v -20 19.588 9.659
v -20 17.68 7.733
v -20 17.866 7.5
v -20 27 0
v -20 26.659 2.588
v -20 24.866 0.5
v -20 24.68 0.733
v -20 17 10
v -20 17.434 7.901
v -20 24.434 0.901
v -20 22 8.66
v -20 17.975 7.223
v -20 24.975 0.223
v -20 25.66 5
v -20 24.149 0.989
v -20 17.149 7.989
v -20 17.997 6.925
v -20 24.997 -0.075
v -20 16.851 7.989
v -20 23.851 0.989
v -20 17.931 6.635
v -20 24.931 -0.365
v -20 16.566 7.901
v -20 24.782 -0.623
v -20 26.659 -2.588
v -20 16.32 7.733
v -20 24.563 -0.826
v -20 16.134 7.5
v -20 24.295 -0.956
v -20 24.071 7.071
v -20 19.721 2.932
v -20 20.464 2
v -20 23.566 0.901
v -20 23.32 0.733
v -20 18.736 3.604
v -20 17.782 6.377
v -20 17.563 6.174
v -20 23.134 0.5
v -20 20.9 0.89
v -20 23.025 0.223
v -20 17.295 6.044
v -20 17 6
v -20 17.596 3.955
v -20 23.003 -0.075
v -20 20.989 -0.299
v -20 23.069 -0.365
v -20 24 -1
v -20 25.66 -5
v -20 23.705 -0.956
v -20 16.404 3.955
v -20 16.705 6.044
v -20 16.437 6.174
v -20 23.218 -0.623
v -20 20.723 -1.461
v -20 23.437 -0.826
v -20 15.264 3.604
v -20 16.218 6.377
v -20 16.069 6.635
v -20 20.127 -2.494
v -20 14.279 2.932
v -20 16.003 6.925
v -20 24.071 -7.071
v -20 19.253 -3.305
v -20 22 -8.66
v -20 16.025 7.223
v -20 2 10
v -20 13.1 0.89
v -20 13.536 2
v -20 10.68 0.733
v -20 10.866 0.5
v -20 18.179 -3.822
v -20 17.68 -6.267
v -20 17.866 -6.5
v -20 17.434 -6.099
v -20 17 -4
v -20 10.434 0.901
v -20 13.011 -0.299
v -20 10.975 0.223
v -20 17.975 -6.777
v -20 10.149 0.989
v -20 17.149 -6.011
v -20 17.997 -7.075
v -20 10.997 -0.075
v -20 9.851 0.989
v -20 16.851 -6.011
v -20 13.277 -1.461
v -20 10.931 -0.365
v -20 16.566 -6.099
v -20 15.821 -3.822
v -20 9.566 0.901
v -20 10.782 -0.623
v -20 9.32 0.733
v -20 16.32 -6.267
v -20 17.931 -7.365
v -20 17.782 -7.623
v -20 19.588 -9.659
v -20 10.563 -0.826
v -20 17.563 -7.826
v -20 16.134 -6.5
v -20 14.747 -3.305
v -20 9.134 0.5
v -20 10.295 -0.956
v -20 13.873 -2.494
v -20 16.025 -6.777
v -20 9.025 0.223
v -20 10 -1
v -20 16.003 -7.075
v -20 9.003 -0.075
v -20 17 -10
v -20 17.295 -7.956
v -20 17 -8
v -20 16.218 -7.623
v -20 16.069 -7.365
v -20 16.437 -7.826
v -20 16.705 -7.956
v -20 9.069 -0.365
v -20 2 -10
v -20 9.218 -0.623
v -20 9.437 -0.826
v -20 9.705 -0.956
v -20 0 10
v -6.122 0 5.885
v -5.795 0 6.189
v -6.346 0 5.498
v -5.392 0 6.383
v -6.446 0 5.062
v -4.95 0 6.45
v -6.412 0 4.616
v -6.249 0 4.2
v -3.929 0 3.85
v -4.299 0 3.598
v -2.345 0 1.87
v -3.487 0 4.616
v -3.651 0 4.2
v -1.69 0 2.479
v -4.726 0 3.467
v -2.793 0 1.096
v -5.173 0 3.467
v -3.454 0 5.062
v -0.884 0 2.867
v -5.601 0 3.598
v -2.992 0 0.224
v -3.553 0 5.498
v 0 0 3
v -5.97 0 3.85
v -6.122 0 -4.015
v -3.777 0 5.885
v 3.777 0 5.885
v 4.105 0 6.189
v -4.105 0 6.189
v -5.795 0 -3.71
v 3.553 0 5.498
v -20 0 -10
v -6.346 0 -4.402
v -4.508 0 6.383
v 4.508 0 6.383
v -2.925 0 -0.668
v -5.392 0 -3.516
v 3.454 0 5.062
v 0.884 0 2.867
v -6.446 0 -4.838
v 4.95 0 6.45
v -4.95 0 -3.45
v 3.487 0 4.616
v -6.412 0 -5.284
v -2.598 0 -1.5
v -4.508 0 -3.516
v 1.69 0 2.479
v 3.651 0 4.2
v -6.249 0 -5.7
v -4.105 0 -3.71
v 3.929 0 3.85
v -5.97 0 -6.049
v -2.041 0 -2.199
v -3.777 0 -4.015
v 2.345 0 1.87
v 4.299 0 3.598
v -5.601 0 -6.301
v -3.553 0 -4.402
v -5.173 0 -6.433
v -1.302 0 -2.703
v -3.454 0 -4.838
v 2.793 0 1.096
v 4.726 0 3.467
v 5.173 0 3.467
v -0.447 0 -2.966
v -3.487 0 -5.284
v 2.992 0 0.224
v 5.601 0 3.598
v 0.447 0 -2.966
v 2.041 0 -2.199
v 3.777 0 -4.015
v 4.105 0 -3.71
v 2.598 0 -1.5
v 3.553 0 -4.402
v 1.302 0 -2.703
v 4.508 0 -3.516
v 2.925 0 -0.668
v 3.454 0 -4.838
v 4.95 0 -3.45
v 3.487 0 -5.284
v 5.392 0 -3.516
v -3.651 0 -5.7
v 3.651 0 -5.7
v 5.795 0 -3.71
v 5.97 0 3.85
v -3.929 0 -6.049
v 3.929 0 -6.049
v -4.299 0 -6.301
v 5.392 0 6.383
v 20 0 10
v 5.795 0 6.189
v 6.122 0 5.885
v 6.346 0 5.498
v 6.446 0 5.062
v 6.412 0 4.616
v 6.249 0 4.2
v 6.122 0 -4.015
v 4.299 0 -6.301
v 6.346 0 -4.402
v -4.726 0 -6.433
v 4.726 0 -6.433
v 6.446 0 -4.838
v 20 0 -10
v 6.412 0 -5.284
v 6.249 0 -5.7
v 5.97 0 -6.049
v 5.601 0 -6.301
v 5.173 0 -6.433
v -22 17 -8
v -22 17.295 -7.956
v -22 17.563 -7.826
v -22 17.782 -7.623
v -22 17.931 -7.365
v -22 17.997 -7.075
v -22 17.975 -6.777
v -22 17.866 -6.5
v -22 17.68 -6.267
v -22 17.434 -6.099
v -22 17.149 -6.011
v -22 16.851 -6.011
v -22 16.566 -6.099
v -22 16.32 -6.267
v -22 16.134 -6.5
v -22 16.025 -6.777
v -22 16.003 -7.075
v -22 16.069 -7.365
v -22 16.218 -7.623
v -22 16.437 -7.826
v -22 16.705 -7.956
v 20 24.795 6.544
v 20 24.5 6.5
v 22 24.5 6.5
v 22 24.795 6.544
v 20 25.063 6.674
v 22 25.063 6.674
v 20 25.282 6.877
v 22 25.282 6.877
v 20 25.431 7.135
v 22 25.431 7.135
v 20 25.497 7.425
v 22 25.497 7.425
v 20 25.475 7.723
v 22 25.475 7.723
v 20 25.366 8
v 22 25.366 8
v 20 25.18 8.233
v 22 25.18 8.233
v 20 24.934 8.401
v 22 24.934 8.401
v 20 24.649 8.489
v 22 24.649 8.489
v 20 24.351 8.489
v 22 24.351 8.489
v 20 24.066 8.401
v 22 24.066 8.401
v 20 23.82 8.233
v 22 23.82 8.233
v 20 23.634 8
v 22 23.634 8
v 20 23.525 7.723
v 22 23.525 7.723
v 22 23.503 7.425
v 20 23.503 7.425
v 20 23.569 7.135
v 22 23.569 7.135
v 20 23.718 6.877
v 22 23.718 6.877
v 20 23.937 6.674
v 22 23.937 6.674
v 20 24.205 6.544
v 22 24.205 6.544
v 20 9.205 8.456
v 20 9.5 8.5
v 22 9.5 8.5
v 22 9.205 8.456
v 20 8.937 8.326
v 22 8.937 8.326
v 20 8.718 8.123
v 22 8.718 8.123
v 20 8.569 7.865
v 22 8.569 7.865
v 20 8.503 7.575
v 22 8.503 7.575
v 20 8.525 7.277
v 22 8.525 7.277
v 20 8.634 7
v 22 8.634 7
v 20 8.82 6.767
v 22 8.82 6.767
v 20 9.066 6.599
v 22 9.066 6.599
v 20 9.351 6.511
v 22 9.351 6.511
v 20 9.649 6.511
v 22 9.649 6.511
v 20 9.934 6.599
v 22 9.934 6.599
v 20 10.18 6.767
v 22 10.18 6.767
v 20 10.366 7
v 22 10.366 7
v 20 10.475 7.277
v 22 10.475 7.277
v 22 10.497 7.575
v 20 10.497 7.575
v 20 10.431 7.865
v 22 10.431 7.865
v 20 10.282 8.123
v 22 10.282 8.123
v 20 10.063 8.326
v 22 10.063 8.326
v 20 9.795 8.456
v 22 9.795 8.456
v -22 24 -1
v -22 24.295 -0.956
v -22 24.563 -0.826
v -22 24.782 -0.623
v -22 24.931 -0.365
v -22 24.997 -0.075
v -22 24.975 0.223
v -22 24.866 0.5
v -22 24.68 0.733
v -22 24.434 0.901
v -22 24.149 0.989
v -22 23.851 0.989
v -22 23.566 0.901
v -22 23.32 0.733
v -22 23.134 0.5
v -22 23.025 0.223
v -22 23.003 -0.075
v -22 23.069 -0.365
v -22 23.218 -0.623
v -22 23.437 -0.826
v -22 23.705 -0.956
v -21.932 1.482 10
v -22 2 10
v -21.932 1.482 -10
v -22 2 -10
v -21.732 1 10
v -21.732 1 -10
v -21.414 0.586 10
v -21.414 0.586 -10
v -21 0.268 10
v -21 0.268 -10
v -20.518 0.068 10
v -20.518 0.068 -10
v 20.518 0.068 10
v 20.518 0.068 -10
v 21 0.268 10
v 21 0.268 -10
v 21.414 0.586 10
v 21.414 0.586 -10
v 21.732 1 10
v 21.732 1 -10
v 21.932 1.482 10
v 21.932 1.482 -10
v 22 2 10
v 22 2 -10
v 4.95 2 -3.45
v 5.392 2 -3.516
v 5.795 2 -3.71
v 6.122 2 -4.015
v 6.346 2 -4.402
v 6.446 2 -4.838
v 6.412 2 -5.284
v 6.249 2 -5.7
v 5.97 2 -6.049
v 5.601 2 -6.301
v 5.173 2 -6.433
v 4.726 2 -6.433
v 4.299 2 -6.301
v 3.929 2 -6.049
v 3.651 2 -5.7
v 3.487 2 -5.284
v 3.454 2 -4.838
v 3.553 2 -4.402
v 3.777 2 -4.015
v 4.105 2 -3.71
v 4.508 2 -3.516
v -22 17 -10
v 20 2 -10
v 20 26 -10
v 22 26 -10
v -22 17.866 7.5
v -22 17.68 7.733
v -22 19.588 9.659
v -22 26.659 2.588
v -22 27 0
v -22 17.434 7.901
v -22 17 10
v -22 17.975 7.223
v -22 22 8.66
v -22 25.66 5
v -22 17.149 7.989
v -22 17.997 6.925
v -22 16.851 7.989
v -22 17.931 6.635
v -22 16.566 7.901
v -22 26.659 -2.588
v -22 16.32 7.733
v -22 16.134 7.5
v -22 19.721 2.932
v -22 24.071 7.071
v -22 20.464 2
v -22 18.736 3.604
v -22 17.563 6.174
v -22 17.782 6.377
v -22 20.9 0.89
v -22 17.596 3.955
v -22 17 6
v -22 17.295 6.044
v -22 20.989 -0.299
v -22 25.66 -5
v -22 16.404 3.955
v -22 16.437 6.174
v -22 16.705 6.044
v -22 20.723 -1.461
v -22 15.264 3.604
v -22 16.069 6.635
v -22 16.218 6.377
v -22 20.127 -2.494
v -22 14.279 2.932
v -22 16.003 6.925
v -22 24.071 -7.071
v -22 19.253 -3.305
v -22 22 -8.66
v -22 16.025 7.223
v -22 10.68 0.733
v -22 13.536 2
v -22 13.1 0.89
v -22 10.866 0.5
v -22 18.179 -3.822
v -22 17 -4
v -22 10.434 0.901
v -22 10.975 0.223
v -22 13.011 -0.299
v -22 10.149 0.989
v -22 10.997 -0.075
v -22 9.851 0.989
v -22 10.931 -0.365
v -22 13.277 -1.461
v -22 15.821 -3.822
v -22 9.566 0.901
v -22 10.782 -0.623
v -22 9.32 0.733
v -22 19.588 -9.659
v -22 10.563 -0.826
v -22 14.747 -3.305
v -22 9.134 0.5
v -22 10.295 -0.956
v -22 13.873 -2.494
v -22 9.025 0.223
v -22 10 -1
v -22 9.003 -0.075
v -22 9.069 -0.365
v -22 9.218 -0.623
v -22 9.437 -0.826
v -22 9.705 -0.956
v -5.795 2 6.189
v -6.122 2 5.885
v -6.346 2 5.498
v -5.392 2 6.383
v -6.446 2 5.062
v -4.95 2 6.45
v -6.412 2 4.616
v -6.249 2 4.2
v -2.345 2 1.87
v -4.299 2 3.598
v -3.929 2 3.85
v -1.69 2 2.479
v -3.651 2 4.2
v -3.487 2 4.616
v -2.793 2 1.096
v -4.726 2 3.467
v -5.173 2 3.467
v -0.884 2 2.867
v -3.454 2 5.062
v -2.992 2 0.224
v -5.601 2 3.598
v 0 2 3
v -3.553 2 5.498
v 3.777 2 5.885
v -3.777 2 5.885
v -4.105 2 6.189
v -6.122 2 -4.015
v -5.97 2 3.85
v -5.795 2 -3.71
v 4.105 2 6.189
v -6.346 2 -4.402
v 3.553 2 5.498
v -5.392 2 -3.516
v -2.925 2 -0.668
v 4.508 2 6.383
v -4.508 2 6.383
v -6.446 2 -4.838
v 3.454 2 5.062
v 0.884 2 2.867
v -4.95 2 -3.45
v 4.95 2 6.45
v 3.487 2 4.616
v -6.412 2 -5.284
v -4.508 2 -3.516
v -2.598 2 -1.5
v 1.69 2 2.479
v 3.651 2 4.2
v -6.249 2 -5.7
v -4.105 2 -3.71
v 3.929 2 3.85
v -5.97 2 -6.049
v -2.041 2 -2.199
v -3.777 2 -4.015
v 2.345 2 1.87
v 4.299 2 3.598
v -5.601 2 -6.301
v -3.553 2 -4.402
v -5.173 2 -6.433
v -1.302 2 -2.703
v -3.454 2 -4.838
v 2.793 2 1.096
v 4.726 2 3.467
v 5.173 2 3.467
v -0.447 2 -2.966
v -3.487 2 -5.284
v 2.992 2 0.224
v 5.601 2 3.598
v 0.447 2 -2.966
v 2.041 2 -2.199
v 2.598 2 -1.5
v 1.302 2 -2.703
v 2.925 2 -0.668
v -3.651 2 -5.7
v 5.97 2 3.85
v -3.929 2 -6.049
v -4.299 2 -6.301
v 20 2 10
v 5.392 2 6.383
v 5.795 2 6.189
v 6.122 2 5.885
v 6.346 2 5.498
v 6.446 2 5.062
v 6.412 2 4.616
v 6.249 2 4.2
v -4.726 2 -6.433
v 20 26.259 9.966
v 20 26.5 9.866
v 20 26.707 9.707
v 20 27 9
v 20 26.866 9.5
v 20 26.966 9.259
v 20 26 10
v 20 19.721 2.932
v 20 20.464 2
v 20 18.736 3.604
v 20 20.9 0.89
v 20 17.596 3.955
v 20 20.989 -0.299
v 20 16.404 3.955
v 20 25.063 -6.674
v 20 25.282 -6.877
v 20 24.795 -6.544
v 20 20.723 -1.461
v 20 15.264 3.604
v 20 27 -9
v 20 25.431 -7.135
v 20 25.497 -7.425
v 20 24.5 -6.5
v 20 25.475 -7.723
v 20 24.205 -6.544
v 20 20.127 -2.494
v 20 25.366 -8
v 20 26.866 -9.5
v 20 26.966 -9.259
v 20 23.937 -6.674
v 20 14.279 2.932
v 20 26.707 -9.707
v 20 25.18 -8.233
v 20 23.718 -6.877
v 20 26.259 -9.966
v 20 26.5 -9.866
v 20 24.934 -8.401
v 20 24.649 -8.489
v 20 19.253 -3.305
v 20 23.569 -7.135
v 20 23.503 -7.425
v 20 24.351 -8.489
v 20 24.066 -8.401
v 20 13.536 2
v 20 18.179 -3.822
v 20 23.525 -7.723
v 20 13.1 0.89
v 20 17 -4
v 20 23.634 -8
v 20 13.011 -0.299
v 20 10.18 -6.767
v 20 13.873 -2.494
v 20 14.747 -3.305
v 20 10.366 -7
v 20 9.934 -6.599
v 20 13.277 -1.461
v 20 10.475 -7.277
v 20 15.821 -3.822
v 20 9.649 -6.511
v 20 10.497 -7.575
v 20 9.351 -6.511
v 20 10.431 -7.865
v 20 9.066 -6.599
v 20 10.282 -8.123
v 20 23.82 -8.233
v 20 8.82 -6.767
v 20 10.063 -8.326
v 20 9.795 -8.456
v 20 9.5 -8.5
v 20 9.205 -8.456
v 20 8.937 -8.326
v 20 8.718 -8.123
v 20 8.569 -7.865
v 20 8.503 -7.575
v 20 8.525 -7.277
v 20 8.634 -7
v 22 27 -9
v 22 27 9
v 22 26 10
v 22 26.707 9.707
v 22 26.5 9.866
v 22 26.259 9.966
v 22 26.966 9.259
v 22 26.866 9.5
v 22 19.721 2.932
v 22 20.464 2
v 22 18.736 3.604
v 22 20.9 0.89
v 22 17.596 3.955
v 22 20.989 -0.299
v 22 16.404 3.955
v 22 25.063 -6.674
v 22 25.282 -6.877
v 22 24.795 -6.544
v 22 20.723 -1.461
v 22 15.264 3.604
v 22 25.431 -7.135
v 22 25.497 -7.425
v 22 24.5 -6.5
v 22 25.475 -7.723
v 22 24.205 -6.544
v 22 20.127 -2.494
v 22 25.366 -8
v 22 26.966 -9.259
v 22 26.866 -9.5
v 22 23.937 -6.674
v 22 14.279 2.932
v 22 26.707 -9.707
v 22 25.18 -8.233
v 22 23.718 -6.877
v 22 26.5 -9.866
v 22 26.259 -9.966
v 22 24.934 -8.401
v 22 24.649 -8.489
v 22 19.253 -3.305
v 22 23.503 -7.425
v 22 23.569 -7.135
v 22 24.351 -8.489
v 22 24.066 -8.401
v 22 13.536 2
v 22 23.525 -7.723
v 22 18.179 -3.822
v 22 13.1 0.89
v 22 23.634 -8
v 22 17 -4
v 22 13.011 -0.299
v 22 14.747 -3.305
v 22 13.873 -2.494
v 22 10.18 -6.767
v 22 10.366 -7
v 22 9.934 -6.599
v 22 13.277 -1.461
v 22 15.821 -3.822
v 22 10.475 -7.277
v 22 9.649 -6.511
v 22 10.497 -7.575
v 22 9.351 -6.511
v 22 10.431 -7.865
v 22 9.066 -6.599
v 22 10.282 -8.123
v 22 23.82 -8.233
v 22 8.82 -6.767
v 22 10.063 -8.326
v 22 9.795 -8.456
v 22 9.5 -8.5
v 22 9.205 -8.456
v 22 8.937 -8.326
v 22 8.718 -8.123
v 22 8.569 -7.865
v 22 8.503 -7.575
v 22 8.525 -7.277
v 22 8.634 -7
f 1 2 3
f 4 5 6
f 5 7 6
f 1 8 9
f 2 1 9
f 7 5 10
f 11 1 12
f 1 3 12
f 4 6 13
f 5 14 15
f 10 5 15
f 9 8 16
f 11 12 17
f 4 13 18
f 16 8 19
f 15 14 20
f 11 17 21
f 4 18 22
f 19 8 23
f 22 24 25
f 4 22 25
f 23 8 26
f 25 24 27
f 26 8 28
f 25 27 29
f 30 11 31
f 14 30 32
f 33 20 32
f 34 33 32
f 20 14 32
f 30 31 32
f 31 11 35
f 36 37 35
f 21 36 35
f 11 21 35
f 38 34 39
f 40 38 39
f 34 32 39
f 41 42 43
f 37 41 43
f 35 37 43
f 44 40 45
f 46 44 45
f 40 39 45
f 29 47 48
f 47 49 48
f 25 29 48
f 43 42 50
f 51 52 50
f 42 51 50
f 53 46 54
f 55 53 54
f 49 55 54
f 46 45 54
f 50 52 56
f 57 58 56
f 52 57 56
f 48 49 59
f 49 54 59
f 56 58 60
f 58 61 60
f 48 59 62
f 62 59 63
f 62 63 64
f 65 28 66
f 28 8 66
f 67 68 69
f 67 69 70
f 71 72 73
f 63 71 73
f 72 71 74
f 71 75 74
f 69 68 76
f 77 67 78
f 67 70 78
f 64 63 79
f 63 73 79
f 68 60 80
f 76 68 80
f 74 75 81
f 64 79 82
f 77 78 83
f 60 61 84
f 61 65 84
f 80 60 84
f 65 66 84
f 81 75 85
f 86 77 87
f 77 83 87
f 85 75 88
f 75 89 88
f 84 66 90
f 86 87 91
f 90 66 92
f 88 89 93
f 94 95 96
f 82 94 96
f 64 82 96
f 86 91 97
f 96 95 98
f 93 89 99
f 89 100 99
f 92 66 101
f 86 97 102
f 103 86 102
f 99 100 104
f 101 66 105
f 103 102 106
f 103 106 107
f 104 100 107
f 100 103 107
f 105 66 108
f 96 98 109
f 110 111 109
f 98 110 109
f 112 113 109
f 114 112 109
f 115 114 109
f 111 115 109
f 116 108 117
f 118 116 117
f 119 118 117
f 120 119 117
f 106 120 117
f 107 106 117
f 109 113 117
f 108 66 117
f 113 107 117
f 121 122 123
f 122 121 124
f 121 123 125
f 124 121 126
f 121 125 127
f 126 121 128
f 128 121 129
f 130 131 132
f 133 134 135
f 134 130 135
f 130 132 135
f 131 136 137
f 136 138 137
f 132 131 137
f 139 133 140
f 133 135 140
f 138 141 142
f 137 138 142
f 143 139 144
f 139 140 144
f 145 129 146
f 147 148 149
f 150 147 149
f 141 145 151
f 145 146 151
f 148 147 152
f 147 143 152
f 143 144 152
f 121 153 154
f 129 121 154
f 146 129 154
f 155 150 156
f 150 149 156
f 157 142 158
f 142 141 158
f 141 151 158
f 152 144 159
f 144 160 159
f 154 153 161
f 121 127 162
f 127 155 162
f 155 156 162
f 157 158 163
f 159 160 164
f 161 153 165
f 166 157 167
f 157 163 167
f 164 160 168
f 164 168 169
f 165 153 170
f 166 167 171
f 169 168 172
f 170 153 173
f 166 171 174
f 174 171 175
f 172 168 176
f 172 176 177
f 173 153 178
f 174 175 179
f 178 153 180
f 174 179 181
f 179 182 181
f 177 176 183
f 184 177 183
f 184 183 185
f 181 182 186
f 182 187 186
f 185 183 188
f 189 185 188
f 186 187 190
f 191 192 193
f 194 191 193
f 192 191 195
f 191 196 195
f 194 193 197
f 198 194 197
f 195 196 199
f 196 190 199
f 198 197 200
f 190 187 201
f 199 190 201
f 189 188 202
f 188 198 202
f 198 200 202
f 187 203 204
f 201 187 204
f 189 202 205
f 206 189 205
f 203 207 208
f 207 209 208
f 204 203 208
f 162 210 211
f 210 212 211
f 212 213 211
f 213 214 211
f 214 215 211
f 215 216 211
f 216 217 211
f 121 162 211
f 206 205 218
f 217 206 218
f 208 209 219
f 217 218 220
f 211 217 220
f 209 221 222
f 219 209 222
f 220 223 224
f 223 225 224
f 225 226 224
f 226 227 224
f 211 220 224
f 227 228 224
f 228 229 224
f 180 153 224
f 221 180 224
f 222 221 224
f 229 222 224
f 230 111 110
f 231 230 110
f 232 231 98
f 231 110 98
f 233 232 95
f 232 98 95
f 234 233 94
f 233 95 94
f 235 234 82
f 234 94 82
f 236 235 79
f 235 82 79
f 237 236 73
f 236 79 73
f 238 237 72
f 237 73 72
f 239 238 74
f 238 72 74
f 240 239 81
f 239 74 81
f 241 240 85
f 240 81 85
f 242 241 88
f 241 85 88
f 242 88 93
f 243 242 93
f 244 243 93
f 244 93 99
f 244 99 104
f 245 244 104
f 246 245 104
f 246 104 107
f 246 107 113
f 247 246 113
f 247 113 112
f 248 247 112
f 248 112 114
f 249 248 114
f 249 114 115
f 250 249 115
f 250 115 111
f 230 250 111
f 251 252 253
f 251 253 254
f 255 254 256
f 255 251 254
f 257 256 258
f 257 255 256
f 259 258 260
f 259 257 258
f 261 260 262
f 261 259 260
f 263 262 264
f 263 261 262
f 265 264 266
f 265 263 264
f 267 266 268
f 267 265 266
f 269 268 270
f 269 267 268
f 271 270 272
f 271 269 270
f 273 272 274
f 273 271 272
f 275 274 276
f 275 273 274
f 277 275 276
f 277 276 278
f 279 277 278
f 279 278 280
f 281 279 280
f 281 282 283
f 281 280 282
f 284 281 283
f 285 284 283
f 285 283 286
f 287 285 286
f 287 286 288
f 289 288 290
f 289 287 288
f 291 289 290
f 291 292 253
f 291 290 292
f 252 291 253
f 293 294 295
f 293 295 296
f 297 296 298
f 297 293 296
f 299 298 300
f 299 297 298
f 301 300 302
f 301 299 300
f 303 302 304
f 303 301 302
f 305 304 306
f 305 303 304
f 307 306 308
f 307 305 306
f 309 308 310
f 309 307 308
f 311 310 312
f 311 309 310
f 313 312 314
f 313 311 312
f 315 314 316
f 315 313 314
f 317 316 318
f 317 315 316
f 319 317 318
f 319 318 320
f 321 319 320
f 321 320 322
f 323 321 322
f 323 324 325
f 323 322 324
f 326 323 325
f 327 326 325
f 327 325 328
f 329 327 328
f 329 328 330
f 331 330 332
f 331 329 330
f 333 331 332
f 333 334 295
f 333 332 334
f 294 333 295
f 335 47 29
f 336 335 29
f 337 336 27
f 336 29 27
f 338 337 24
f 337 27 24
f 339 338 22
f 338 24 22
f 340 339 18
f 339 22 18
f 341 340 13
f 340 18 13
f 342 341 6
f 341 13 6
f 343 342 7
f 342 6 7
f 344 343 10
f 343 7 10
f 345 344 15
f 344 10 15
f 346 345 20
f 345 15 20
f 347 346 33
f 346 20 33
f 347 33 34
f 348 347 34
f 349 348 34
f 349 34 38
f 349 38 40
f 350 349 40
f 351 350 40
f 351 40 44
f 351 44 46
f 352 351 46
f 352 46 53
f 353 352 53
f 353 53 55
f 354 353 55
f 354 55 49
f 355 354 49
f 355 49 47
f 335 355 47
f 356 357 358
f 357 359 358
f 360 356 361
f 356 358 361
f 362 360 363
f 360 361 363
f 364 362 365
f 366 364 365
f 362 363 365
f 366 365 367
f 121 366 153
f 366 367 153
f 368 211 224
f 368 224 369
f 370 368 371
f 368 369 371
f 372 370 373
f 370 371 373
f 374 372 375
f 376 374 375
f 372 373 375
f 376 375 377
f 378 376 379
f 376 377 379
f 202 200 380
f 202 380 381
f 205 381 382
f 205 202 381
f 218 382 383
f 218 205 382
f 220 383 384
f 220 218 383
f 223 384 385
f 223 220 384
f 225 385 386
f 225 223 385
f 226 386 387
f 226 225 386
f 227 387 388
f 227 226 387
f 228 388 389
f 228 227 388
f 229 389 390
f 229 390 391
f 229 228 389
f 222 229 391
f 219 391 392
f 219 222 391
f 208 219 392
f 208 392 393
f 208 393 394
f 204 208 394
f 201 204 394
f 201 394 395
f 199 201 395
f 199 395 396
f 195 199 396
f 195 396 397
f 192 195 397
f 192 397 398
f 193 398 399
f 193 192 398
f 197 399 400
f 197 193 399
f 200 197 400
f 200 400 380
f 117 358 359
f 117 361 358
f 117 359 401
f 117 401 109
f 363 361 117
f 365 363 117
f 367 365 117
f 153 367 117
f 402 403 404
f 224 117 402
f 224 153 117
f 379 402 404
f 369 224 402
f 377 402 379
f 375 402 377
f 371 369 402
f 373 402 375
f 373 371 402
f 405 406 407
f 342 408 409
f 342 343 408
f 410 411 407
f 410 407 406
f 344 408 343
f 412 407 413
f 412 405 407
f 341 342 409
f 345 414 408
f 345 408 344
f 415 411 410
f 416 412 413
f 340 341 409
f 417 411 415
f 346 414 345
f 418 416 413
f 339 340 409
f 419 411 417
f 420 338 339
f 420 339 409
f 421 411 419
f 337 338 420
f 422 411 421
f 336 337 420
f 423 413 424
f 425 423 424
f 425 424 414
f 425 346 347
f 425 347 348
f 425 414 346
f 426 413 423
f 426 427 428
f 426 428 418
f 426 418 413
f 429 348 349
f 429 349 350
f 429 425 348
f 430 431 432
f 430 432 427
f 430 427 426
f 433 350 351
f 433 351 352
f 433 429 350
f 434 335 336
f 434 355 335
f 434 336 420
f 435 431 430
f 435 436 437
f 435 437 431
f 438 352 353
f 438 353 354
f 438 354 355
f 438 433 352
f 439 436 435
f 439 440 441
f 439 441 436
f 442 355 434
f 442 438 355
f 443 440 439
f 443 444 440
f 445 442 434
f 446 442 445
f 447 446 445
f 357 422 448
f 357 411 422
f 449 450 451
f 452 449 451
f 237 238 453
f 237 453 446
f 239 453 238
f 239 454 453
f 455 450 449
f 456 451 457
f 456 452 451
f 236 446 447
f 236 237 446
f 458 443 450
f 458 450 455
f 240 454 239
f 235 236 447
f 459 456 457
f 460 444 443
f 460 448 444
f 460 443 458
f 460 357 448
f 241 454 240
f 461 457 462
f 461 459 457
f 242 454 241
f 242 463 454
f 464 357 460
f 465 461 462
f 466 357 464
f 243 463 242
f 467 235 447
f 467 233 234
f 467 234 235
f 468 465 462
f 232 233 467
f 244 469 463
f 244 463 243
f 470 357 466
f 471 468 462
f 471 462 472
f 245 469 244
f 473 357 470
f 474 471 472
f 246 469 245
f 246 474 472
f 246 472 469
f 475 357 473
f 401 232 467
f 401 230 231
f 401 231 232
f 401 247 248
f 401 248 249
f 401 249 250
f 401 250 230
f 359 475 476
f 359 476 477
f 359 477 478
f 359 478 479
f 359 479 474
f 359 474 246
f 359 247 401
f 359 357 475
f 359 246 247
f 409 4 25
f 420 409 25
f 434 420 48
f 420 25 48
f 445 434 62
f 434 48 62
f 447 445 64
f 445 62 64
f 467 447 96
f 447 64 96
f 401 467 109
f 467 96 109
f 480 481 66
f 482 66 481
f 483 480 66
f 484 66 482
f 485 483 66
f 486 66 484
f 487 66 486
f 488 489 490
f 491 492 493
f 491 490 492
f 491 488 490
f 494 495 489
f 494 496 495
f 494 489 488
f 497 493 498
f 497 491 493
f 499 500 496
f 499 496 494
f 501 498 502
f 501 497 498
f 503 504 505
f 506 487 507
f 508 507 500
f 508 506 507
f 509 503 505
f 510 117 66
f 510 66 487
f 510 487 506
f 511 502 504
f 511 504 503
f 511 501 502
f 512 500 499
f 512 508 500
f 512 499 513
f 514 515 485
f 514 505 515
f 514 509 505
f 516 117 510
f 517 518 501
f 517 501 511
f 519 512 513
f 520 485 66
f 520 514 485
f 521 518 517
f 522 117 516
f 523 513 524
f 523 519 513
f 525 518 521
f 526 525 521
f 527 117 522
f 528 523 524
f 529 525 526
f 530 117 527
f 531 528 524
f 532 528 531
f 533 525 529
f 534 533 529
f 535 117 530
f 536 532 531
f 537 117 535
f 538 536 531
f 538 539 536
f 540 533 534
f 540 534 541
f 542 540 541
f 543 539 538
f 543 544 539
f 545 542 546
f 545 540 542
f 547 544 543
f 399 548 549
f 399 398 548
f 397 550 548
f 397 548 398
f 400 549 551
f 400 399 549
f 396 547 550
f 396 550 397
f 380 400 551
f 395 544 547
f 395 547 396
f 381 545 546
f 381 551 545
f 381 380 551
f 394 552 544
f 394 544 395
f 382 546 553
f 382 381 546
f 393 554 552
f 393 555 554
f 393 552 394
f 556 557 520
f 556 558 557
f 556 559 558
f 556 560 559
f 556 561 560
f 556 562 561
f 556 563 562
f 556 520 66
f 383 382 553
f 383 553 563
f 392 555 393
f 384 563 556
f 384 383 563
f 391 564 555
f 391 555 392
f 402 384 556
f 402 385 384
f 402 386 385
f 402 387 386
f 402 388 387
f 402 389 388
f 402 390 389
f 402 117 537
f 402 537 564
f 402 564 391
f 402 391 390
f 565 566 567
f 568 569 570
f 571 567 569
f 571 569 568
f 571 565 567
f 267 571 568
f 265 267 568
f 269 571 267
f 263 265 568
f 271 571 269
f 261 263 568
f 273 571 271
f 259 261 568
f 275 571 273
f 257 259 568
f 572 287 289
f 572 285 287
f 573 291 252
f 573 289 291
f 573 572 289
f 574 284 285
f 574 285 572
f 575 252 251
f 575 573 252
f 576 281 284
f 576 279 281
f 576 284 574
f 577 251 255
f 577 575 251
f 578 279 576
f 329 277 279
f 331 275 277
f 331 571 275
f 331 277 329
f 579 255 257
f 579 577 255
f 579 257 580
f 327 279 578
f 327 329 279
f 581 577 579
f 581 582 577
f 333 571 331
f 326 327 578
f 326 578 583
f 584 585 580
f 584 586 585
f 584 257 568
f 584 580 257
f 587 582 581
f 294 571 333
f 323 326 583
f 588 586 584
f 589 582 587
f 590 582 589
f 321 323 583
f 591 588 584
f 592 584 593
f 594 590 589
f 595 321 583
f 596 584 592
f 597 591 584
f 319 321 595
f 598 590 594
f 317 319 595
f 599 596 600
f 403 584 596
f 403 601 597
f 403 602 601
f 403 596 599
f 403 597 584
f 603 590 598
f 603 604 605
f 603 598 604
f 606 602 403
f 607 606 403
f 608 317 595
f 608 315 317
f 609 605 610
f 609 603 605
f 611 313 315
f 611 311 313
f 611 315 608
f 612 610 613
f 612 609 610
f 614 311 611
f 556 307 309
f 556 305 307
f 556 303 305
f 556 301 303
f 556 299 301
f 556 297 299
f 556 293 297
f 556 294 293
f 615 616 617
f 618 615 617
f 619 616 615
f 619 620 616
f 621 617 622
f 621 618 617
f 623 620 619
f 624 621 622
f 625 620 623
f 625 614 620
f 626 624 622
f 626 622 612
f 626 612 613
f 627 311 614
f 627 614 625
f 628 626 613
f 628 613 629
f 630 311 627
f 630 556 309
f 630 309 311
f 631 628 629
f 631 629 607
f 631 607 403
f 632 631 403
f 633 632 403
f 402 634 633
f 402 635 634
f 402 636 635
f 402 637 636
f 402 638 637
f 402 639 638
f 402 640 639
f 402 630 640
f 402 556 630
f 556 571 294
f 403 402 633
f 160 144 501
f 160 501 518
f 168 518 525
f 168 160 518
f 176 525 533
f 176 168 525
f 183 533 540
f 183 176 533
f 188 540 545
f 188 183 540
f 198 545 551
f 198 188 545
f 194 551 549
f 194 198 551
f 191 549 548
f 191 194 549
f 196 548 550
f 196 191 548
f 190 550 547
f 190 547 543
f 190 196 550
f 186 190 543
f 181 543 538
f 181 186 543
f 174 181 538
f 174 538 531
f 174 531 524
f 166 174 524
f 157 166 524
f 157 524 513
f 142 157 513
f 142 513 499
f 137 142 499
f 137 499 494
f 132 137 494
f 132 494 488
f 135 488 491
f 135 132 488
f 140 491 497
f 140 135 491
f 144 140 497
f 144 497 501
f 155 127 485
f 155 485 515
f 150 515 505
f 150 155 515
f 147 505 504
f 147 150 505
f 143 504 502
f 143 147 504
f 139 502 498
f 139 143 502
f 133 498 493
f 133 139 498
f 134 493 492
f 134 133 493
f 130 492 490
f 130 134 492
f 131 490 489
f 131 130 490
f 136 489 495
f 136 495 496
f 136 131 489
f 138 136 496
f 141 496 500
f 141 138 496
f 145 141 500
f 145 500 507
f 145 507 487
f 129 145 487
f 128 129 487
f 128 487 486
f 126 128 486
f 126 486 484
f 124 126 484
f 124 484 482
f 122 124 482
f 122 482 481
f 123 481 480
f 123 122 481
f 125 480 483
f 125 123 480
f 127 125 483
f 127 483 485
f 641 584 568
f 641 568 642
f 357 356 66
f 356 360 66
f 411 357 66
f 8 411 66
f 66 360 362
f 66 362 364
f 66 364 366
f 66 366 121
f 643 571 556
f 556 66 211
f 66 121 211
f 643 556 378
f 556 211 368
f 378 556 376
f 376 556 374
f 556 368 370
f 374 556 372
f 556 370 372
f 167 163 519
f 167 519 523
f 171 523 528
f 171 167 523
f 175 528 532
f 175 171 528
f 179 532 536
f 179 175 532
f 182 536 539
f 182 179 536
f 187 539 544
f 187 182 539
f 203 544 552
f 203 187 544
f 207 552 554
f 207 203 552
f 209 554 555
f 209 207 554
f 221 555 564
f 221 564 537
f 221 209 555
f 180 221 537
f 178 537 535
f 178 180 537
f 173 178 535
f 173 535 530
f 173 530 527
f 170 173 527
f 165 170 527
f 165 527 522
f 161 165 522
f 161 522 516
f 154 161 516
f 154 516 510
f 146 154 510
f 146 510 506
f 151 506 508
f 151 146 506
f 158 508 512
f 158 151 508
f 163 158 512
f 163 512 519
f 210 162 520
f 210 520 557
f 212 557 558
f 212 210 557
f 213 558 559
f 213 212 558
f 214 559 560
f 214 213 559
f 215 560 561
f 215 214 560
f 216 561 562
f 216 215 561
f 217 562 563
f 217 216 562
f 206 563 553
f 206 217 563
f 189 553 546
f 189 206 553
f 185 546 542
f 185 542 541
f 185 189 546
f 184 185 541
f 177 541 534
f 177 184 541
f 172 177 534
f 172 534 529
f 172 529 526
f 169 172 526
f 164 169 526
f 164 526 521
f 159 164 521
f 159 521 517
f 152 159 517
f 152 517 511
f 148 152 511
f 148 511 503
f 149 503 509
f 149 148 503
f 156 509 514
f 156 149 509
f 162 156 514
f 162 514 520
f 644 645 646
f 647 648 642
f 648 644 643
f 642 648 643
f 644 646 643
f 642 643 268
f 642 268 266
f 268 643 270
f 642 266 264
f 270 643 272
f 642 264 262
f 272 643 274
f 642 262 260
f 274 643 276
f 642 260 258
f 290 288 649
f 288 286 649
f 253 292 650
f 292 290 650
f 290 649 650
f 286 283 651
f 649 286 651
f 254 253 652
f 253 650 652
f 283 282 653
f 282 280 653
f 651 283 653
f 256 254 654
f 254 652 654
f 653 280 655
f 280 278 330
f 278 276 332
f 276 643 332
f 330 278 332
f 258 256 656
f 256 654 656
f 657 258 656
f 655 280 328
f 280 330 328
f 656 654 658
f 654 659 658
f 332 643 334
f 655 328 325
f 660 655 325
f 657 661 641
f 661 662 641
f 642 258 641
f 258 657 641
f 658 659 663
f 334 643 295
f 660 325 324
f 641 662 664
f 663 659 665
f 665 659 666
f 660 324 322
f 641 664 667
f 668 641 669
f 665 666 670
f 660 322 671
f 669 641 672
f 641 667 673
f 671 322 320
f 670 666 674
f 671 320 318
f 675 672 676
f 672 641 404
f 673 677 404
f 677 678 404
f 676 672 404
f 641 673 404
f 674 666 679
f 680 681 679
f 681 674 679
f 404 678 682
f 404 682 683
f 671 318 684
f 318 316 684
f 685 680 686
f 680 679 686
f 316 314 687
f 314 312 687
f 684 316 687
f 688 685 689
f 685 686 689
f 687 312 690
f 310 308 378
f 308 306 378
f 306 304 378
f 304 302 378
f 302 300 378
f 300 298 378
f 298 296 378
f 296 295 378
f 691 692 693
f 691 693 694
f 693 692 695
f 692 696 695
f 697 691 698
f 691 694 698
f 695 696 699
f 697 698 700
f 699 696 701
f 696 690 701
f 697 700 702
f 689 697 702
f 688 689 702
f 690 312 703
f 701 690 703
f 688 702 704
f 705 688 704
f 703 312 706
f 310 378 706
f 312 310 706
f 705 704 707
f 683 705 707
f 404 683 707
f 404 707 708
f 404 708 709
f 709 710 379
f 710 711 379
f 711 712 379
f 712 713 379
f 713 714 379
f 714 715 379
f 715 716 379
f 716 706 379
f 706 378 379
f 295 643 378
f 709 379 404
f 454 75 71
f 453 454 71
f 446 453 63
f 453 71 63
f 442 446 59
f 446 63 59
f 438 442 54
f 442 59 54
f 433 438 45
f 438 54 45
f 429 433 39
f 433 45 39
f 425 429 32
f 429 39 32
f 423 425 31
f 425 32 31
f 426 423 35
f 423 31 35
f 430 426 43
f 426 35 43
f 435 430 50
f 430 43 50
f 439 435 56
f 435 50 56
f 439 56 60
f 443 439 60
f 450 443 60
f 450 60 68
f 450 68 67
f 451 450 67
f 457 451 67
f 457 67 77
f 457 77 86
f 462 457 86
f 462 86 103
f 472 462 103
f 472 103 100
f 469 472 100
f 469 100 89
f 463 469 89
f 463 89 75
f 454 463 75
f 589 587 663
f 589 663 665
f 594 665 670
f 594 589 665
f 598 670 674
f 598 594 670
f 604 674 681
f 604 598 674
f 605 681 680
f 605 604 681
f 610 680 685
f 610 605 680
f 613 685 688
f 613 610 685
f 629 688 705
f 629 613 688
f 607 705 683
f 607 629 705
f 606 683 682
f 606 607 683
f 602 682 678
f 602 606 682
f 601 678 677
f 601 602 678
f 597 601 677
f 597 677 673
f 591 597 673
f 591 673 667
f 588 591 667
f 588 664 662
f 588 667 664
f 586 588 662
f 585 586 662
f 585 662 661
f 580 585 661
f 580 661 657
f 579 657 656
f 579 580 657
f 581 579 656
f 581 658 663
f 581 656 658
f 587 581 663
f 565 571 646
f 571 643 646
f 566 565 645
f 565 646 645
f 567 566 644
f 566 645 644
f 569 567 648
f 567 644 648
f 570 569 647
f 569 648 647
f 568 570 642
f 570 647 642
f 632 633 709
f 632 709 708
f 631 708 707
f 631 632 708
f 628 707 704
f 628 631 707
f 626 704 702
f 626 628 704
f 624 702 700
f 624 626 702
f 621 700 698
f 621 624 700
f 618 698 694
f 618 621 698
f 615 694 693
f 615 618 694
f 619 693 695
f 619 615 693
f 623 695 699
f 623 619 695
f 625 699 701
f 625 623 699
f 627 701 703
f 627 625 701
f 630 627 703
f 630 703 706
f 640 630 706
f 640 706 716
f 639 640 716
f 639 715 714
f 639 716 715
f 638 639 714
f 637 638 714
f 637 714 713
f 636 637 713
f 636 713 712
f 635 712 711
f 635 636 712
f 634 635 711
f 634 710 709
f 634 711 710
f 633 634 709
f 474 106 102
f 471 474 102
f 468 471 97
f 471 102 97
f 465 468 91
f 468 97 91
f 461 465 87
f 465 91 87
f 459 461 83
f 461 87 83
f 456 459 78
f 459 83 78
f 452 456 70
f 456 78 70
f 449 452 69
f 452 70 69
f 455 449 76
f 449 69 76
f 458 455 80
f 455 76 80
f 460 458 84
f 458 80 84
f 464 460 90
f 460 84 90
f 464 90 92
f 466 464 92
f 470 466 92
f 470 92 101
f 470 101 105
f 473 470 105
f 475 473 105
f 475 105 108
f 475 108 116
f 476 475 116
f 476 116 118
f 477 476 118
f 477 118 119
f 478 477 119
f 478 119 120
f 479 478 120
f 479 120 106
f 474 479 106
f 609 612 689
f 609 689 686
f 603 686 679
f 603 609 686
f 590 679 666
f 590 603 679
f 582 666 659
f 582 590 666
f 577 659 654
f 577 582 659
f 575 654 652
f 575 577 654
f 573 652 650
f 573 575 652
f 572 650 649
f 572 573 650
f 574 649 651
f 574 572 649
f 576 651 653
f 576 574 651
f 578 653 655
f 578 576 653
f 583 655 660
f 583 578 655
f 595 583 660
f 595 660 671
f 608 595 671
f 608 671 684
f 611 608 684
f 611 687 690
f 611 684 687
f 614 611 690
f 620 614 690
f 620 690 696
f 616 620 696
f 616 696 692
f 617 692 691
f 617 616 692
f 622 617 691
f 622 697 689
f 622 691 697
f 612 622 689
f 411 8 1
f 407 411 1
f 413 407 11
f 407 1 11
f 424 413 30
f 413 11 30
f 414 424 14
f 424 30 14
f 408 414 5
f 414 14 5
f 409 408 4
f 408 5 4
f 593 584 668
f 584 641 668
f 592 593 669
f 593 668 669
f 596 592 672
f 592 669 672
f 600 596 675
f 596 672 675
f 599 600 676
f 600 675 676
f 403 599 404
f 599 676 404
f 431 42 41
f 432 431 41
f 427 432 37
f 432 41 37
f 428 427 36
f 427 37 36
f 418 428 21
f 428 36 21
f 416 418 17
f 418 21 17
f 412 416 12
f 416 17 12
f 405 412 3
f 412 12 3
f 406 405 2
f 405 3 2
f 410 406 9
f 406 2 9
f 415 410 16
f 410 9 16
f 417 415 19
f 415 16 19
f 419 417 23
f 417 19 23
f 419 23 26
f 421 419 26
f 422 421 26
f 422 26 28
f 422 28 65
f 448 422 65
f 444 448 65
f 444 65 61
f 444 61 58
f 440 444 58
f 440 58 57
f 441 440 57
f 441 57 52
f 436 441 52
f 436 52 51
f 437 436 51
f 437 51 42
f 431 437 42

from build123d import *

# Parameters (mm, degrees)
SKETCH_1_W          = 40
SKETCH_1_H          = 20
SKETCH_1_R          = 3
SKETCH_1_R_2        = 1.5
EXTRUDE_1_DEPTH     = 2
SKETCH_2_W          = 2
SKETCH_2_H          = 20
EXTRUDE_2_DEPTH     = 27
SKETCH_3_R          = 4
SKETCH_3_R_2        = 1
CUT_EXTRUDE_1_DEPTH = 22
SKETCH_4_R          = 4
SKETCH_4_R_2        = 1
CUT_EXTRUDE_2_DEPTH = 37.235341864
FILLET_1_R          = 2
FILLET_2_R          = 1


with BuildPart() as part:
    # 草图1 → 凸台-拉伸1 (new body)
    with BuildSketch(Plane(origin=(0, 0, 0), x_dir=(1, 0, 0), z_dir=(0, 1, 0))):
        Rectangle(SKETCH_1_W, SKETCH_1_H)
        with Locations(Location((0, 0, 0), (0, 0, 270))):
            Circle(SKETCH_1_R, mode=Mode.SUBTRACT)
        with Locations(Location((-4.949747468, -4.949747468, 0), (0, 0, 270))):
            Circle(SKETCH_1_R_2, mode=Mode.SUBTRACT)
        with Locations(Location((-4.949747468, 4.949747468, 0), (0, 0, 270))):
            Circle(SKETCH_1_R_2, mode=Mode.SUBTRACT)
        with Locations(Location((4.949747468, 4.949747468, 0), (0, 0, 270))):
            Circle(SKETCH_1_R_2, mode=Mode.SUBTRACT)
        with Locations(Location((4.949747468, -4.949747468, 0), (0, 0, 270))):
            Circle(SKETCH_1_R_2, mode=Mode.SUBTRACT)
    extrude(amount=EXTRUDE_1_DEPTH)

    # 草图2 → 凸台-拉伸2 (add)
    with BuildSketch(Plane(origin=(0, 0, 0), x_dir=(1, 0, 0), z_dir=(0, 1, 0))):
        with Locations((21, 0)):
            Rectangle(SKETCH_2_W, SKETCH_2_H)
        with Locations((-21, 0)):
            Rectangle(SKETCH_2_W, SKETCH_2_H)
    extrude(amount=EXTRUDE_2_DEPTH)

    # 草图3 → 切除-拉伸1 (cut)
    with BuildSketch(Plane(origin=(0, 0, 0), x_dir=(0, 0, -1), z_dir=(1, 0, 0))):
        with BuildLine():
            Line((-10, 27), (-10, 17))
            ThreePointArc((-10, 17), (-7.071067827, 24.071067797), (-4.3e-08, 27))
            Line((-4.3e-08, 27), (-10, 27))
        make_face()
        with BuildLine():
            ThreePointArc((-4.3e-08, 27), (7.071067797, 24.071067827), (10, 17))
            Line((10, 17), (10, 27))
            Line((10, 27), (-4.3e-08, 27))
        make_face()
        with Locations((0, 17)):
            Circle(SKETCH_3_R)
        with Locations((0, 10)):
            Circle(SKETCH_3_R_2)
        with Locations((7, 17)):
            Circle(SKETCH_3_R_2)
        with Locations((0, 24)):
            Circle(SKETCH_3_R_2)
        with Locations((-7, 17)):
            Circle(SKETCH_3_R_2)
    extrude(amount=-CUT_EXTRUDE_1_DEPTH, mode=Mode.SUBTRACT)

    # 草图4 → 切除-拉伸2 (cut, through all)
    with BuildSketch(Plane(origin=(0, 0, 0), x_dir=(0, 0, -1), z_dir=(1, 0, 0))):
        with Locations((0, 17)):
            Circle(SKETCH_4_R)
        with Locations((-7.5, 24.5)):
            Circle(SKETCH_4_R_2)
        with Locations(Location((-7.5, 9.5, 0), (0, 0, 180))):
            Circle(SKETCH_4_R_2)
        with Locations((7.5, 9.5)):
            Circle(SKETCH_4_R_2)
        with Locations(Location((7.5, 24.5, 0), (0, 0, 180))):
            Circle(SKETCH_4_R_2)
    extrude(amount=CUT_EXTRUDE_2_DEPTH, mode=Mode.SUBTRACT)

    # 圆角1
    fillet_1_edges = [part.edges().sort_by_distance(p)[0] for p in [
        (22, 0, 0),
        (-22, 0, 0),
    ]]
    fillet(fillet_1_edges, radius=FILLET_1_R)

    # 圆角2
    fillet_2_edges = [part.edges().sort_by_distance(p)[0] for p in [
        (21, 27, 10),
        (21, 27, -10),
    ]]
    fillet(fillet_2_edges, radius=FILLET_2_R)


solid = part.part
